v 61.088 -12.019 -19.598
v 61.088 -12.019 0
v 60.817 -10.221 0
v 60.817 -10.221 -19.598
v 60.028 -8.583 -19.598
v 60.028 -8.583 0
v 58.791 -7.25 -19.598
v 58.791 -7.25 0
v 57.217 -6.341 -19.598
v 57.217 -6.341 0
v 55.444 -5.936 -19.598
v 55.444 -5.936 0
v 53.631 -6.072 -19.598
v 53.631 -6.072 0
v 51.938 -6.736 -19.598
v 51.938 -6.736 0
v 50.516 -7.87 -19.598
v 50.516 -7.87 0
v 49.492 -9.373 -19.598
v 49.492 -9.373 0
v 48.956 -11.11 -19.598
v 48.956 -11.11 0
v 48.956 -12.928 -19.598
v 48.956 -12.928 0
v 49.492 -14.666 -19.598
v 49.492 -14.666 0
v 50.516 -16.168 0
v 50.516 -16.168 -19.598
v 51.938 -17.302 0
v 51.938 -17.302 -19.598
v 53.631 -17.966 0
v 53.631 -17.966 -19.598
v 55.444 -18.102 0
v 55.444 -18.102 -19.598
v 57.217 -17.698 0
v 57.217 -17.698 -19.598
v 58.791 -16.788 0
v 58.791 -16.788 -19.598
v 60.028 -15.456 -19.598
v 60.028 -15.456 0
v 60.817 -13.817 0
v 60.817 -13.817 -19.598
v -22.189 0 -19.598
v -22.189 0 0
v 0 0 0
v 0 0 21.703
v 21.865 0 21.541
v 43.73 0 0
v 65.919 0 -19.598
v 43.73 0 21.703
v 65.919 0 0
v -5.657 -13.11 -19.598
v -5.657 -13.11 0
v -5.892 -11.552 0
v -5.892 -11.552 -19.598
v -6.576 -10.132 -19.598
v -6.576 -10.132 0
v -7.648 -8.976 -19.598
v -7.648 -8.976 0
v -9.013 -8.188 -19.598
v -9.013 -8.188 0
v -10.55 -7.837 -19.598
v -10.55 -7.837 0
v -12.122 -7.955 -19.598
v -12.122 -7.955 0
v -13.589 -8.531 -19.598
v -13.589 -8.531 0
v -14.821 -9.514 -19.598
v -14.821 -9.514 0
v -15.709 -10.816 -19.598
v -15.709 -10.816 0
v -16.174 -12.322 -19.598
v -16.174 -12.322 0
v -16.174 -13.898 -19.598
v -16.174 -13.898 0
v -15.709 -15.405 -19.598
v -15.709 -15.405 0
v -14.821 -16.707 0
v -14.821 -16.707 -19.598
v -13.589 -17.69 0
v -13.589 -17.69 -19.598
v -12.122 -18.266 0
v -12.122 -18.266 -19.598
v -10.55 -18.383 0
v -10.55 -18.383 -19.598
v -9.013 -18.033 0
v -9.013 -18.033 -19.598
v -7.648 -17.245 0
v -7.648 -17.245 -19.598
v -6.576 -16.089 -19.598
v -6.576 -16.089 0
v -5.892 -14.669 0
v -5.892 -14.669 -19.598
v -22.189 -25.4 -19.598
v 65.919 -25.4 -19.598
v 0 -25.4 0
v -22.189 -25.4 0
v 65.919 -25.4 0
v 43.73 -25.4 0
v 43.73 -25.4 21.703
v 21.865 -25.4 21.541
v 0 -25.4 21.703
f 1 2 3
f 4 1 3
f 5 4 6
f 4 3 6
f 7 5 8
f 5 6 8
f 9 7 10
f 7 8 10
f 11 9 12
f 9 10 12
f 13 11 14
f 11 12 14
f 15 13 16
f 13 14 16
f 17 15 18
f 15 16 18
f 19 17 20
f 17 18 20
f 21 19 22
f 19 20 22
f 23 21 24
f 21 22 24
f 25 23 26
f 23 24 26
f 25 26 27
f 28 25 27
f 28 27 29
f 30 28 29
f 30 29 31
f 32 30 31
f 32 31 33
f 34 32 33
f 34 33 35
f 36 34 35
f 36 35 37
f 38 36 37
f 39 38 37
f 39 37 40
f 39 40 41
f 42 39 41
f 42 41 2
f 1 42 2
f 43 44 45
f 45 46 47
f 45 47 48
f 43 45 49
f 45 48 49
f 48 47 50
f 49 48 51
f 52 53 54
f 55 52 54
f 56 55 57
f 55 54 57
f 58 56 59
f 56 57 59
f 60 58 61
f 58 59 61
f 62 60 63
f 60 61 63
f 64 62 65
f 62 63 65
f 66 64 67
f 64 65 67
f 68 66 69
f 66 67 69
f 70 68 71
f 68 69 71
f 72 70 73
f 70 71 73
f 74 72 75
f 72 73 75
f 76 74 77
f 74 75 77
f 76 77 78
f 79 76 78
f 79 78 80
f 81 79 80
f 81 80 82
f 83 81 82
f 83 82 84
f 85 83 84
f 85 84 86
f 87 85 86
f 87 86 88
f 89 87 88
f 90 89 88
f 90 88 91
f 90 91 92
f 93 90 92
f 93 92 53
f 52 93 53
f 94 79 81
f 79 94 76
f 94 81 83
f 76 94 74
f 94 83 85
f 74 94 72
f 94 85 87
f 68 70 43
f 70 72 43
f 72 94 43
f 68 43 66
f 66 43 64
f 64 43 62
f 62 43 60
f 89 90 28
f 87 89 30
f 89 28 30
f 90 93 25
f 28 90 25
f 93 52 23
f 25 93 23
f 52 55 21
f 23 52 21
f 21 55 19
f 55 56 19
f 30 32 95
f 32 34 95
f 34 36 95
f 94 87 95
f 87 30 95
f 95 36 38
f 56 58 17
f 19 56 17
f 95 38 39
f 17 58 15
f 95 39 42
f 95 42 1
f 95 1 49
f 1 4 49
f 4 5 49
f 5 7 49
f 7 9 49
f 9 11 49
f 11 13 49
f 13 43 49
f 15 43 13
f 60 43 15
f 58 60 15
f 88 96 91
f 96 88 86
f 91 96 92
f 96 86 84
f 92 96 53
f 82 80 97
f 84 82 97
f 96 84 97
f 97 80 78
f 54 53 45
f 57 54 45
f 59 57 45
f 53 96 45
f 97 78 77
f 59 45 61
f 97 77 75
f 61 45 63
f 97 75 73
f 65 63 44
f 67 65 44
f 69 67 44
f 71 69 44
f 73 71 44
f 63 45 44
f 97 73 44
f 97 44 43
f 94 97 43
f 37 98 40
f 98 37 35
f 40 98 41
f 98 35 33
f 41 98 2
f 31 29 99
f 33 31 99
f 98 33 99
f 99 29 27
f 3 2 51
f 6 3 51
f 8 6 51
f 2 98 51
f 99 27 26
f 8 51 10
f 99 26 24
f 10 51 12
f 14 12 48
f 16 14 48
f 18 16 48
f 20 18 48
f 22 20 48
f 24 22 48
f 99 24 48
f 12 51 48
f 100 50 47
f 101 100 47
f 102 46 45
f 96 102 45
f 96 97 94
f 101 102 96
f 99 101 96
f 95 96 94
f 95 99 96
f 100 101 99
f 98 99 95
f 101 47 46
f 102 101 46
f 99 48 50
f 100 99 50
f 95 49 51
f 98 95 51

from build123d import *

# Parameters (mm, degrees)
F1_DEPTH = 25.4
F3_DEPTH = 25.4
F4_R     = 6.100082
F6_DEPTH = 50.8
F2_R     = 5.287895
F8_DEPTH = 25.4


with BuildPart() as f1:
    # F0 (on Front) → F1 (new body)
    with BuildSketch(Plane.XZ):
        Polygon((0, 21.703117), (0, 0), (-22.189008, 0), (-22.189008, -19.597592), (10.689595, -19.597592), (21.865079, -19.597592), (21.865079, 21.541156), align=None)
    extrude(amount=F1_DEPTH)

    # F0 (on Front) → F3 (join)
    with BuildSketch(Plane.XZ):
        Polygon((0, 21.703117), (0, 0), (-22.189008, 0), (-22.189008, -19.597592), (10.689595, -19.597592), (21.865079, -19.597592), (21.865079, 21.541156), align=None)
        Polygon((43.730158, 21.703117), (21.865079, 21.541156), (21.865079, -19.597592), (33.040564, -19.597592), (65.919166, -19.597592), (65.919166, 0), (43.730158, 0), align=None)
    extrude(amount=F3_DEPTH)

    # F4 (on Top) → F6 (cut)
    with BuildSketch(Plane.XY):
        with Locations((54.988019, -12.019237)):
            Circle(F4_R)
    extrude(amount=-F6_DEPTH, mode=Mode.SUBTRACT)

    # F2 (on Top) → F8 (cut)
    with BuildSketch(Plane.XY):
        with Locations((-10.94509, -13.110346)):
            Circle(F2_R)
    extrude(amount=-F8_DEPTH, mode=Mode.SUBTRACT)


solid = f1.part
